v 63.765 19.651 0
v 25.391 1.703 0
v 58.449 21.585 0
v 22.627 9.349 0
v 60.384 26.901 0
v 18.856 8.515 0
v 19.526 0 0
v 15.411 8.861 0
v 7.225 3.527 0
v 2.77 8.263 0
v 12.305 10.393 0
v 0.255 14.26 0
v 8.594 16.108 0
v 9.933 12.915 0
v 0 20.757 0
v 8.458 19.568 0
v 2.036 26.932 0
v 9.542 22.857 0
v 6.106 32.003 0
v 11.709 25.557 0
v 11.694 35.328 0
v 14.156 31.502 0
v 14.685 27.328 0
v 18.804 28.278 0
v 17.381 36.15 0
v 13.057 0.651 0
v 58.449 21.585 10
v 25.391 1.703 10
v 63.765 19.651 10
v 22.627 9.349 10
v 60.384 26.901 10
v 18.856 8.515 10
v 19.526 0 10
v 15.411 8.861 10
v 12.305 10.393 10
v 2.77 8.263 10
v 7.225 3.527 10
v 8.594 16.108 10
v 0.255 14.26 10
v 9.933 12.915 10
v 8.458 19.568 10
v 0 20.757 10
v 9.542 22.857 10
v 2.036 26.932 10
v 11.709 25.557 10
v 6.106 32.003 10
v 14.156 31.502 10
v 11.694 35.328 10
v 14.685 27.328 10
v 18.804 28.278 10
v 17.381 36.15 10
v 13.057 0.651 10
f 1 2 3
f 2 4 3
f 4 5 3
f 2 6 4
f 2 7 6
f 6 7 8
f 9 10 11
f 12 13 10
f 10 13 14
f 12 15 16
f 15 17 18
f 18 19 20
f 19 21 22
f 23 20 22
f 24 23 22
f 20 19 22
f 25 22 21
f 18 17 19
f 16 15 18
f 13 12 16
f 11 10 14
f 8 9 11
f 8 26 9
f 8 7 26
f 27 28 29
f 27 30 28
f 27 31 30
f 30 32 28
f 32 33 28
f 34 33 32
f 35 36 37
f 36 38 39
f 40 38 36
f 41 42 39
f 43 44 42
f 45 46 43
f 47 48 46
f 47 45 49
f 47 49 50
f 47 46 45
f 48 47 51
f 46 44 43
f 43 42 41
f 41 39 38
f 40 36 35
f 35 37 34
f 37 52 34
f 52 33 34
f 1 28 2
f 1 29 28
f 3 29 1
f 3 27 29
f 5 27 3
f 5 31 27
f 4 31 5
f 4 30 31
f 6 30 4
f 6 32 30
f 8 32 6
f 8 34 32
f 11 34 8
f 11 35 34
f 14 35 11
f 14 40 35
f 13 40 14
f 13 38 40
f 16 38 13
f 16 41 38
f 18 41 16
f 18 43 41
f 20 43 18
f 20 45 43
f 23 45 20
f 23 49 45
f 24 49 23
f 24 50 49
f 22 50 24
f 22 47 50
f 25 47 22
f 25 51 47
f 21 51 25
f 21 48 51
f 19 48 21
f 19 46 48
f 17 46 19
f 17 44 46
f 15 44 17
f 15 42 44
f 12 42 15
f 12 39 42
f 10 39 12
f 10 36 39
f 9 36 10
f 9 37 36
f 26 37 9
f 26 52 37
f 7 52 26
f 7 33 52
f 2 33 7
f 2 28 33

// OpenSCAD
$fn = 32;

// ----------------------------------------------------------------------
// Hook plate: curl radius 14 mm over 205 degrees, 8 mm thick band
// ----------------------------------------------------------------------

// --- parameters (mm) ---
profile_height = 10;      // extrusion height
profile_points = 26;      // points of the closed outline

profile = [[14.156, 31.502], [17.381, 36.15], [11.694, 35.328], [6.106, 32.003], [2.036, 26.932], [0, 20.757], [0.255, 14.26], [2.77, 8.263], [7.225, 3.527], [13.057, 0.651], [19.526, 0], [25.391, 1.703], [63.765, 19.651], [58.449, 21.585], [60.384, 26.901], [22.627, 9.349], [18.856, 8.515], [15.411, 8.861], [12.305, 10.393], [9.933, 12.915], [8.594, 16.108], [8.458, 19.568], [9.542, 22.857], [11.709, 25.557], [14.685, 27.328], [18.804, 28.278]];  // single closed polygon, 26 points, counter clockwise

// --- the one profile operation ---
linear_extrude(height = profile_height) polygon(points = profile);
